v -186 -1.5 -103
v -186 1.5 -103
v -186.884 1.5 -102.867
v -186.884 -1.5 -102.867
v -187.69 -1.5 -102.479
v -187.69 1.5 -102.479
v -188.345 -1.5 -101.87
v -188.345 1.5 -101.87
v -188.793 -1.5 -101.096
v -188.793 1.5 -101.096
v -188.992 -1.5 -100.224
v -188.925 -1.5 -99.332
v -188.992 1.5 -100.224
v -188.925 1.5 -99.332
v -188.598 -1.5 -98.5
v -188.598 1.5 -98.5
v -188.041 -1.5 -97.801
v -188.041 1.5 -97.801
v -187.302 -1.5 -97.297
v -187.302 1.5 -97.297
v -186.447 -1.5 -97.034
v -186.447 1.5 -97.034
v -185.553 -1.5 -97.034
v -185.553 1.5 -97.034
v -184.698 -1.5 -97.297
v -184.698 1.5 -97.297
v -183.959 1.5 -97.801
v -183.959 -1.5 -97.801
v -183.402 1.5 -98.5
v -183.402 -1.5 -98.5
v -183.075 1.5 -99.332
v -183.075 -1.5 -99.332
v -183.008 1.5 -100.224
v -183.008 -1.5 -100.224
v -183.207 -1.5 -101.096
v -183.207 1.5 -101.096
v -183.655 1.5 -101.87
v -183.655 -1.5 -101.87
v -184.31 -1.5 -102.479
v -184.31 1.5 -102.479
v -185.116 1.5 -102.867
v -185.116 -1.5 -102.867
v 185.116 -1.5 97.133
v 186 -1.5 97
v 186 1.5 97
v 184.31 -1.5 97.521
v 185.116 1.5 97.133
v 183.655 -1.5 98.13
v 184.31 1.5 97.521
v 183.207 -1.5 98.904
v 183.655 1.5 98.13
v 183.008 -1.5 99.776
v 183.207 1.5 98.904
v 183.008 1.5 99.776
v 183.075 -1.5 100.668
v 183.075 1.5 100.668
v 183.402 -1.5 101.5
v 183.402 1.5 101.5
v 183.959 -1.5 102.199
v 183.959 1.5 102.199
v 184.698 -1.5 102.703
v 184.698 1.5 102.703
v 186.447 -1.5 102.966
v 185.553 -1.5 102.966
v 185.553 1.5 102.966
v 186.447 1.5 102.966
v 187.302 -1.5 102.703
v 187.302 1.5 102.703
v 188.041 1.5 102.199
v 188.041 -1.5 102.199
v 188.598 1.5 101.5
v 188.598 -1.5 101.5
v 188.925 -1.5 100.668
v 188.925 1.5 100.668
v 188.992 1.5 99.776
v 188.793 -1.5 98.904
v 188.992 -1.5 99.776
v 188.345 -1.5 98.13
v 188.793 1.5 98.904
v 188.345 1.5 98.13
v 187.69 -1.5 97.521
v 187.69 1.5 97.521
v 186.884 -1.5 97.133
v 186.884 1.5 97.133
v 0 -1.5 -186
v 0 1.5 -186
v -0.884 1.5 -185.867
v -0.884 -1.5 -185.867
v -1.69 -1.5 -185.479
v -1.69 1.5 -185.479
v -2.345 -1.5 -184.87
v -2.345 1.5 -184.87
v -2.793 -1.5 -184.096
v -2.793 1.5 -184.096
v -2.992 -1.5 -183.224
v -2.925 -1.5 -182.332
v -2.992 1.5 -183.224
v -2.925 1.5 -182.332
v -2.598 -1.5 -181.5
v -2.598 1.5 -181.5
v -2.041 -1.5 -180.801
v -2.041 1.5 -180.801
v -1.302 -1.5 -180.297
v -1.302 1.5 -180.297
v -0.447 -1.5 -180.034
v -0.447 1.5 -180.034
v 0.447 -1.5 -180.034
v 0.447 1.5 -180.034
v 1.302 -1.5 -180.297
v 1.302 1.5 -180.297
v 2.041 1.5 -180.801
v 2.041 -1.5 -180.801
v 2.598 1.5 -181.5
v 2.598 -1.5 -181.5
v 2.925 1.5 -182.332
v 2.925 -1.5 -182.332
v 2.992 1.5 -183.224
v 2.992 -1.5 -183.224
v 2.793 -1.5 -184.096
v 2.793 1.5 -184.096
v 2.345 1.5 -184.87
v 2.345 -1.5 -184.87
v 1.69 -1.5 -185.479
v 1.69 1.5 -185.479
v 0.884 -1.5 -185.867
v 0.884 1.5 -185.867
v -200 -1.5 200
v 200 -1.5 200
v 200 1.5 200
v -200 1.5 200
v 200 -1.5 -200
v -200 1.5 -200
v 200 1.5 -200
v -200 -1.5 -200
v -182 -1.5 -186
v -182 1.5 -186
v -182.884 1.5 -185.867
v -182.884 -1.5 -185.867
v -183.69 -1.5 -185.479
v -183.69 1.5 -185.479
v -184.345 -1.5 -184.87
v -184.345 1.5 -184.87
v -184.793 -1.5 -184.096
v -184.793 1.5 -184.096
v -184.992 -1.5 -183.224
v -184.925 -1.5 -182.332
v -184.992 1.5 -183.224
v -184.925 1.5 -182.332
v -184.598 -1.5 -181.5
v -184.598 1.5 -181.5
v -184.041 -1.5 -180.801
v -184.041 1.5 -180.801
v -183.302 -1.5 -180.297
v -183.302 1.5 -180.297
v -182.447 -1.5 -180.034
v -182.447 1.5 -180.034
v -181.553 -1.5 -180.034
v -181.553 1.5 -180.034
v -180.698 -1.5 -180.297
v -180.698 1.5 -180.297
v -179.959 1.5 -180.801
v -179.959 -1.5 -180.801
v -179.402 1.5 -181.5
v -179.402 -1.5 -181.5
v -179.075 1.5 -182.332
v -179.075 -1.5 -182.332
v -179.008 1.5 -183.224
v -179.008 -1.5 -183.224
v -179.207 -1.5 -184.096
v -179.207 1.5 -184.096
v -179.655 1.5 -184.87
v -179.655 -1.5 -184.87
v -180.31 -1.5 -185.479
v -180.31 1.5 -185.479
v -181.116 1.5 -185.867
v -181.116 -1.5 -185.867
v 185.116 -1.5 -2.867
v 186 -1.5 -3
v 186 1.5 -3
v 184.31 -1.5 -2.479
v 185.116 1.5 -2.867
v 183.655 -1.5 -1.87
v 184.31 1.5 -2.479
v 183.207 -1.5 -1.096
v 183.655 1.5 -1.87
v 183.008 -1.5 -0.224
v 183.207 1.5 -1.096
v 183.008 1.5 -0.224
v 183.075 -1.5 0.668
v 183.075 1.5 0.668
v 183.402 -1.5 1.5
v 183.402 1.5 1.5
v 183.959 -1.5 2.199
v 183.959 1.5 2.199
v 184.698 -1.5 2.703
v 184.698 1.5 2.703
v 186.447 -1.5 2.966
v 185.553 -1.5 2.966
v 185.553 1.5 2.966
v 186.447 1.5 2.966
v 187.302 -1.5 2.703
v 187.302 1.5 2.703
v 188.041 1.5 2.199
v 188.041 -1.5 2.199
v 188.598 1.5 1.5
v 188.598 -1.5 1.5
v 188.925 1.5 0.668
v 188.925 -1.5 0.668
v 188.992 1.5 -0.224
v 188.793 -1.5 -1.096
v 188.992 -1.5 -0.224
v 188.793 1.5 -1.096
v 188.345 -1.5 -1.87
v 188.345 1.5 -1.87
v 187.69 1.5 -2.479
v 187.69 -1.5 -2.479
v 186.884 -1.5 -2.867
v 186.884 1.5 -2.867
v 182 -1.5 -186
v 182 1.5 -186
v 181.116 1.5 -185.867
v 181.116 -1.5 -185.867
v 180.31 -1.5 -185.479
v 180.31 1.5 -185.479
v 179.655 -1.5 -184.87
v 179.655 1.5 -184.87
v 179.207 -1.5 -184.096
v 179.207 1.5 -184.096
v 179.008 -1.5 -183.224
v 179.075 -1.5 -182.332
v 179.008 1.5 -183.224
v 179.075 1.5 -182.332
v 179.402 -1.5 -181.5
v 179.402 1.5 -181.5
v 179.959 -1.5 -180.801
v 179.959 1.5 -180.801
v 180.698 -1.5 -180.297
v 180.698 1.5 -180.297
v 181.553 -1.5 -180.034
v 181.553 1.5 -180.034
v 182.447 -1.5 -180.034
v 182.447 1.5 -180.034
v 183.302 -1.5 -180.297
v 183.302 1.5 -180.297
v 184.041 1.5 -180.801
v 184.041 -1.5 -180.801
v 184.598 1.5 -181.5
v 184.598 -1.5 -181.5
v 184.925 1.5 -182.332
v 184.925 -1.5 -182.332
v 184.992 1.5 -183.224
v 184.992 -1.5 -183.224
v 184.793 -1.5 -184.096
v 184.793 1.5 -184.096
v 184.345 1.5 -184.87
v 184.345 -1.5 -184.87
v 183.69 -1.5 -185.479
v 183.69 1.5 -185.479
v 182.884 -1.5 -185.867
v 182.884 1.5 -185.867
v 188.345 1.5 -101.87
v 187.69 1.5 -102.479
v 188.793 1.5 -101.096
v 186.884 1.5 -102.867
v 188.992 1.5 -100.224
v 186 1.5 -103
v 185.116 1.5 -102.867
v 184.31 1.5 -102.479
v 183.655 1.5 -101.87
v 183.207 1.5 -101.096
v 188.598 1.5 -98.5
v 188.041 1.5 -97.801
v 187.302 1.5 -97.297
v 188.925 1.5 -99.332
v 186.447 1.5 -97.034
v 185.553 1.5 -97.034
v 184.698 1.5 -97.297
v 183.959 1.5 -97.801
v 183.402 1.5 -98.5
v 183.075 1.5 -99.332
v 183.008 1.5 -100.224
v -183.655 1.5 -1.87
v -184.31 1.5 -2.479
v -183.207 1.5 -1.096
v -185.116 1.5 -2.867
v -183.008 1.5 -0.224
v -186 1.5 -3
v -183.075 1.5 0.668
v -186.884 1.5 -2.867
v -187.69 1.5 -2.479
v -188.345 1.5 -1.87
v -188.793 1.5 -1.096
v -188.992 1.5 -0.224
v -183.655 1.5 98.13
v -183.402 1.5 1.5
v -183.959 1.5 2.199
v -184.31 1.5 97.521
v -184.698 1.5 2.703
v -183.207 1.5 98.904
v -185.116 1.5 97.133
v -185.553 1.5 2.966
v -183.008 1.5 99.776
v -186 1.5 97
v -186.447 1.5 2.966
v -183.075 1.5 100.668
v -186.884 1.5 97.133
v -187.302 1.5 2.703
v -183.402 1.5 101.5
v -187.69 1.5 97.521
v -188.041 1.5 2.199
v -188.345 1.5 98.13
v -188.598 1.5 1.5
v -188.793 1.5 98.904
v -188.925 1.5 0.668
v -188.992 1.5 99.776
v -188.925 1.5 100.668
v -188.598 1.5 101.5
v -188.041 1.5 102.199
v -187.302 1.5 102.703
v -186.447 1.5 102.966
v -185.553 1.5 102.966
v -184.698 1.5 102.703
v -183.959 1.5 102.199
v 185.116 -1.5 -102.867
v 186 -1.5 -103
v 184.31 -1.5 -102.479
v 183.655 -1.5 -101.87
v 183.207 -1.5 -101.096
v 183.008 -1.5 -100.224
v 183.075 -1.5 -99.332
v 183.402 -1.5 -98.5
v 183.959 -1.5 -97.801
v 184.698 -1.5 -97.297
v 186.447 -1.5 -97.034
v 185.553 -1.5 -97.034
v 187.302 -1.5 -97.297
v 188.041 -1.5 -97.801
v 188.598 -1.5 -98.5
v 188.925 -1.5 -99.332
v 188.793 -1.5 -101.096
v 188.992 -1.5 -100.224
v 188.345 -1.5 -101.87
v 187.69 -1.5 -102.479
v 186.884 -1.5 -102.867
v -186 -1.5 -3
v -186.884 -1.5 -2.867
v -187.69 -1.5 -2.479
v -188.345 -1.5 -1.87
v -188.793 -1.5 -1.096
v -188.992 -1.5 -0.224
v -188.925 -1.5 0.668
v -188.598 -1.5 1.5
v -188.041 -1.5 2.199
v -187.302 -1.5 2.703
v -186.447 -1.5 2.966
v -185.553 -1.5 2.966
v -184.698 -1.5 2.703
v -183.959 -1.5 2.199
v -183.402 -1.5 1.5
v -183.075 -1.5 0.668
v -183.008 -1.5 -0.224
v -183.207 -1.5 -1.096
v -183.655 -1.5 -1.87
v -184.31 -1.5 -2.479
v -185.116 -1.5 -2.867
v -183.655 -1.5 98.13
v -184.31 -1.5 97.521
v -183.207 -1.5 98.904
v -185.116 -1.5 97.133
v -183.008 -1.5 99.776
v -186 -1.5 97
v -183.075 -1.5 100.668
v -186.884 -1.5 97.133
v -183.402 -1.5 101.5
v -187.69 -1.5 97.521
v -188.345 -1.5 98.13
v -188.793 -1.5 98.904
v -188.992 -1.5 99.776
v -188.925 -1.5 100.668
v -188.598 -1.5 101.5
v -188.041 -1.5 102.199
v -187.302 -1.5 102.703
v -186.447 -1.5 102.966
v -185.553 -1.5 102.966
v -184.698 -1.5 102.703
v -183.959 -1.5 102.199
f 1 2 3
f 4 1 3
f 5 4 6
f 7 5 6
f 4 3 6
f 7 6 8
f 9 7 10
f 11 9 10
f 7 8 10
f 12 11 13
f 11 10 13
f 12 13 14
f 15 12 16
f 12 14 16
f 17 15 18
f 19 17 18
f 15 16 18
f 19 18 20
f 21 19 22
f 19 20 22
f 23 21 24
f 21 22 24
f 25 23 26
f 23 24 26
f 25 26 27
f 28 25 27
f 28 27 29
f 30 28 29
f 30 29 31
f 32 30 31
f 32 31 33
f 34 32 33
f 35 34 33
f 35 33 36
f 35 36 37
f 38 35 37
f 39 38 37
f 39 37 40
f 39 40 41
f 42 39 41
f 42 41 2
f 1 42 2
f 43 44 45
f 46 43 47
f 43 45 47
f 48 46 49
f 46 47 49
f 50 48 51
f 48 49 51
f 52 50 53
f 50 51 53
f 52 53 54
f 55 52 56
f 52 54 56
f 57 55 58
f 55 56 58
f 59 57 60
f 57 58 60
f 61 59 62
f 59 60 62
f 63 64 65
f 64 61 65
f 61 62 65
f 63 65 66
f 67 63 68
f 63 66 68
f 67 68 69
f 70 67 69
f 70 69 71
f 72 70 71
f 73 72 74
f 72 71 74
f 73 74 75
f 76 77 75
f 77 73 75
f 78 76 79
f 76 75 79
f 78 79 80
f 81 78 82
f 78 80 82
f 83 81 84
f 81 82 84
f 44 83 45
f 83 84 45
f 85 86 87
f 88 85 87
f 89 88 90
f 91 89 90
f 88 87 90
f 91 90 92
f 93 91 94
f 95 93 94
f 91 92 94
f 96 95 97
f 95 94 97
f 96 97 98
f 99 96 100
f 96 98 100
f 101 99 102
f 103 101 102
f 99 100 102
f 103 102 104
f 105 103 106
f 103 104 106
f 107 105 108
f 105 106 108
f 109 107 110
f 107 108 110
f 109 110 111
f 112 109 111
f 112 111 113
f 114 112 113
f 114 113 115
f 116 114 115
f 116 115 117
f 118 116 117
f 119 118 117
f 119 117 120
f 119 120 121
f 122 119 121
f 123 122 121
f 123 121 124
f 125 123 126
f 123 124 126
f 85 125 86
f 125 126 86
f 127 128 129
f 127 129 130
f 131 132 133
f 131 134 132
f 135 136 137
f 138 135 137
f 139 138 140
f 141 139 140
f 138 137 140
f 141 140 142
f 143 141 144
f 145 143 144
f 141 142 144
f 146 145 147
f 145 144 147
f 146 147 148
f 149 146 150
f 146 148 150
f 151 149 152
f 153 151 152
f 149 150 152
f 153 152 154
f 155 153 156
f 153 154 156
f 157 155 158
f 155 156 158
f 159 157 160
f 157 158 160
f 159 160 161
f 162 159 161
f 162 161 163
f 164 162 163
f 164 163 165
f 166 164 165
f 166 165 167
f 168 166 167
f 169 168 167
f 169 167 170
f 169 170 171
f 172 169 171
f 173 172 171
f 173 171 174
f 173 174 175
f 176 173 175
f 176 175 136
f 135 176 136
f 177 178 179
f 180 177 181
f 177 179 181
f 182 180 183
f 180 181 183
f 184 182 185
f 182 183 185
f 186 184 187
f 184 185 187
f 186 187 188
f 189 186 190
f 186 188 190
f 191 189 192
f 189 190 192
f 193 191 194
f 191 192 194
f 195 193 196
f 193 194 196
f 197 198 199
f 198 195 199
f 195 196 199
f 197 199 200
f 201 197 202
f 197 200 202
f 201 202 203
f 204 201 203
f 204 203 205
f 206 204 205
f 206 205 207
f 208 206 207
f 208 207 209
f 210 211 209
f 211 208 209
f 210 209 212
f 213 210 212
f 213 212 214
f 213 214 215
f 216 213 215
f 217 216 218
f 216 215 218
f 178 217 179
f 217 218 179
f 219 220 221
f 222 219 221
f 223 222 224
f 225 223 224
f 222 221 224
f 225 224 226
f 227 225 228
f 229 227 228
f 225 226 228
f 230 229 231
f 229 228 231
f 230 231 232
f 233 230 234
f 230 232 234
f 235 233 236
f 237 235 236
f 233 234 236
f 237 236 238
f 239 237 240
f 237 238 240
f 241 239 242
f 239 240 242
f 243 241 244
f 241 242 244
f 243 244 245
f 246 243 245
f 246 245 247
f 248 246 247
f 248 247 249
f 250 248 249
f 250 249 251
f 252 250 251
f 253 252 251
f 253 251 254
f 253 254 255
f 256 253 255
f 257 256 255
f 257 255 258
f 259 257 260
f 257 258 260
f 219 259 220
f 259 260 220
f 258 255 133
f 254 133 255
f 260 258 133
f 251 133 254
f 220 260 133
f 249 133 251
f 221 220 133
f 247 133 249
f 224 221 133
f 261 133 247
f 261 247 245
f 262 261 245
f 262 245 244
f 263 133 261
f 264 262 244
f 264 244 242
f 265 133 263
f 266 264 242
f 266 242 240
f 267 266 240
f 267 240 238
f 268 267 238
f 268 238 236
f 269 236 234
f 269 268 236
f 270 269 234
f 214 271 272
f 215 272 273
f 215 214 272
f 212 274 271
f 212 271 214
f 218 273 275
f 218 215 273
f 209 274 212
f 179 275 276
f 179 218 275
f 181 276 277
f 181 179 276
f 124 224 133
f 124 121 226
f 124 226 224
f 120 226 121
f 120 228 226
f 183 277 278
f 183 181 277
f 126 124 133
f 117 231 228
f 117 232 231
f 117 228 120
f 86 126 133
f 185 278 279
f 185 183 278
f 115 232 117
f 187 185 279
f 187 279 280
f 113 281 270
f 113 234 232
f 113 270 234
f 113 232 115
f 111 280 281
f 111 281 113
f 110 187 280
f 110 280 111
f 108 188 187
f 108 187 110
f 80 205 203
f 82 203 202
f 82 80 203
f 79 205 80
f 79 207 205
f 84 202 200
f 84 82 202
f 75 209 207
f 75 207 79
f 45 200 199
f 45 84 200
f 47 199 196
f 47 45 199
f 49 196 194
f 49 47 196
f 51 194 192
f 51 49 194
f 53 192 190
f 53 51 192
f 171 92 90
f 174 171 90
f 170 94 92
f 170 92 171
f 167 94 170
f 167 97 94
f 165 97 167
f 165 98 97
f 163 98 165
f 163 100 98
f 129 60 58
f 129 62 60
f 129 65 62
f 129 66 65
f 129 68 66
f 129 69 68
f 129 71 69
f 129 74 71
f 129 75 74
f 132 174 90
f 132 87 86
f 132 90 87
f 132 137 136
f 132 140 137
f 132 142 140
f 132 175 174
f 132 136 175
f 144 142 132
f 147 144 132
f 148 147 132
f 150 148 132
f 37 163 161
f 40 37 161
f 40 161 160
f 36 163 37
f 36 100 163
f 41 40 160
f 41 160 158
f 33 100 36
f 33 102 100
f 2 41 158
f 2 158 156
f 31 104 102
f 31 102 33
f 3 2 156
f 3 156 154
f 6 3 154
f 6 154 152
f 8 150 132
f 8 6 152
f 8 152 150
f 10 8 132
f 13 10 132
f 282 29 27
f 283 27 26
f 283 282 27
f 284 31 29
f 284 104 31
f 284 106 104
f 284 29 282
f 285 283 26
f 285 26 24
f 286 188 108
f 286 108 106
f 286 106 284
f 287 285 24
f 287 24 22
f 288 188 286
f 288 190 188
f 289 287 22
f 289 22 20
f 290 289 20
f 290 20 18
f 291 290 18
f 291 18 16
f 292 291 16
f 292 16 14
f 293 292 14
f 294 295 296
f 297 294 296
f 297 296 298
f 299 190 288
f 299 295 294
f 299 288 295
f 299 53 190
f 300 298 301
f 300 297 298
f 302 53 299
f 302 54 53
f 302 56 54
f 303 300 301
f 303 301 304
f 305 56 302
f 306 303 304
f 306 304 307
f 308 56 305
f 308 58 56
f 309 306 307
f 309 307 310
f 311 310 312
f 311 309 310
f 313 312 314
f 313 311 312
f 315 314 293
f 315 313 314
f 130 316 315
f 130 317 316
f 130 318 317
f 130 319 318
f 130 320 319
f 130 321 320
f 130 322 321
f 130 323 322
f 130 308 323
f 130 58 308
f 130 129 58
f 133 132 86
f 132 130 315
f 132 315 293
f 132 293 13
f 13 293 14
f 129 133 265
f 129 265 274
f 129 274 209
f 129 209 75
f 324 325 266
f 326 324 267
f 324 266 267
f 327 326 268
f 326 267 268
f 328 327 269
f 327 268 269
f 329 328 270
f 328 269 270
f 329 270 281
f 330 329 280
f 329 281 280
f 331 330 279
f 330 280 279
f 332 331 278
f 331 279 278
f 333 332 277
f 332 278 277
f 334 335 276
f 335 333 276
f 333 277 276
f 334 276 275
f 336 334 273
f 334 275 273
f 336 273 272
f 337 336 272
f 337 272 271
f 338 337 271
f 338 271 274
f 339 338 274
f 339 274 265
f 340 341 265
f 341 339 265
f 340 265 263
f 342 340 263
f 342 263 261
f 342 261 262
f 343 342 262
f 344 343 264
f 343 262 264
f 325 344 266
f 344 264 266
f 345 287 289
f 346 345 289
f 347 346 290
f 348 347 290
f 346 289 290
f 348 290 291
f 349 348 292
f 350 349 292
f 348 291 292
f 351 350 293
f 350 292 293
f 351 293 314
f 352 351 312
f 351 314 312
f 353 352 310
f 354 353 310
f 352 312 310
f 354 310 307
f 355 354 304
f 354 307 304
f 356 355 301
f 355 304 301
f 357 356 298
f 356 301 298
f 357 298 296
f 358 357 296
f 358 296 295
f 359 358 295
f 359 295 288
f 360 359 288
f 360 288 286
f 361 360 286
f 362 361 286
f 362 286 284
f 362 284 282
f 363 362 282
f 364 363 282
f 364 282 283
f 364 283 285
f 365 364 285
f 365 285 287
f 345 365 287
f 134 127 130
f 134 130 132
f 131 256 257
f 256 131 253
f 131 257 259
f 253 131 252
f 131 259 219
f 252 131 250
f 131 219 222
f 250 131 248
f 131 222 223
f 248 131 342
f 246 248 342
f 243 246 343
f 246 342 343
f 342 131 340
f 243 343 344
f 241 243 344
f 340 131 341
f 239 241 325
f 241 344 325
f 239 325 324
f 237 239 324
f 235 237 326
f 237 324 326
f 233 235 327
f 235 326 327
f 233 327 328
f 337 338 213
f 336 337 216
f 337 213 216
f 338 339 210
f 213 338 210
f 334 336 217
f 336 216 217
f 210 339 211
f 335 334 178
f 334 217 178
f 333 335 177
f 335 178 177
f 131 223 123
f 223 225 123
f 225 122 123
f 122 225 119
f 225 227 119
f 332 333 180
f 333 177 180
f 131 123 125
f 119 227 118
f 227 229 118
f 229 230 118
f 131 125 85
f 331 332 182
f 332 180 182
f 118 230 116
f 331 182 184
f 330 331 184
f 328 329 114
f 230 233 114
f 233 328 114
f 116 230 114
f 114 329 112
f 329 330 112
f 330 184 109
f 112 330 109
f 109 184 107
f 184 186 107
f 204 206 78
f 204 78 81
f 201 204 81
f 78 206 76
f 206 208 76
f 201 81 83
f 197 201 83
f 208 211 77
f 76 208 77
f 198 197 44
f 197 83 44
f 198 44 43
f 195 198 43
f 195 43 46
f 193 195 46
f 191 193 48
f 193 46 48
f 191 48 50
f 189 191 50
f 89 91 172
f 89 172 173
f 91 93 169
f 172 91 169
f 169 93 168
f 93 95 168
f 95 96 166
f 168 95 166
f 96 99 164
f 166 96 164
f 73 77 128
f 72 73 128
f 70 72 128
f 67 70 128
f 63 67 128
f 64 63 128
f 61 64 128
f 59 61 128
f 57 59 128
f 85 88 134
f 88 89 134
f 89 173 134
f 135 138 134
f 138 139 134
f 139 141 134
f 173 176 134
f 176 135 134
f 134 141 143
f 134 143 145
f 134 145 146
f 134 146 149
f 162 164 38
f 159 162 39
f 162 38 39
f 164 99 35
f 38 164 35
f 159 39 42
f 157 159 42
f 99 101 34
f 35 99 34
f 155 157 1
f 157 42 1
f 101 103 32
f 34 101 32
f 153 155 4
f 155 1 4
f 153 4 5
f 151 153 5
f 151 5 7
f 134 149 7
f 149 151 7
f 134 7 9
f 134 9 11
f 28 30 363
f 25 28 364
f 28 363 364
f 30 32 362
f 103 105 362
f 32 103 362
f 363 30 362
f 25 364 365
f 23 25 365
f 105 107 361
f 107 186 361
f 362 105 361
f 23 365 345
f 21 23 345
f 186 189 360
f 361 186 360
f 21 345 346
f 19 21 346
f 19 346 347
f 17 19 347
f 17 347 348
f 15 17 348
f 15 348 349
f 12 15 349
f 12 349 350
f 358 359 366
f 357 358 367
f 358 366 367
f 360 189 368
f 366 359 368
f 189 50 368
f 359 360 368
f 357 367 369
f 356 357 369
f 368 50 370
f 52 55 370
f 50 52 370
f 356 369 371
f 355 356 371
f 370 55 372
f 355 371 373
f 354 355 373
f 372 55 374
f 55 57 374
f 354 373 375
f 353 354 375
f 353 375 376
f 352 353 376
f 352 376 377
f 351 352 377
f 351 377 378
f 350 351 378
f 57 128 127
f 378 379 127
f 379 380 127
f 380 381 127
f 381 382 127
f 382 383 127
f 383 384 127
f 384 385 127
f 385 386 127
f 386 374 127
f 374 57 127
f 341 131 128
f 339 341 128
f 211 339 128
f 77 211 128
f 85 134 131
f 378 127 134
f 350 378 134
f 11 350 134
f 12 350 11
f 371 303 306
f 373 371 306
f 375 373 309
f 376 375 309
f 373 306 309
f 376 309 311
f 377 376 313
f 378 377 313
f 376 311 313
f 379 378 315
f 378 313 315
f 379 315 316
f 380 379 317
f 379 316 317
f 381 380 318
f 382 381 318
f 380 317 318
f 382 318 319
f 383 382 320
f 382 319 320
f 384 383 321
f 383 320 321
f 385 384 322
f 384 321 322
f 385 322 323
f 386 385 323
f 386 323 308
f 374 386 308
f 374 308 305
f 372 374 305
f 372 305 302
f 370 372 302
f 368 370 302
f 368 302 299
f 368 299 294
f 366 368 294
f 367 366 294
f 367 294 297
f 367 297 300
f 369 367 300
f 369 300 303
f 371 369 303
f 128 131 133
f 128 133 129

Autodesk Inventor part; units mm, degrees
ref_plane "YZ Plane" through (0, 0, 0) normal (1, 0, 0) x (0, 1, 0)
ref_plane "XZ Plane" through (0, 0, 0) normal (0, 1, 0) x (-1, 0, 0)
ref_plane "XY Plane" through (0, 0, 0) normal (0, 0, 1) x (1, 0, 0)
sketch "Sketch1" plane through (0, 0, 0) normal (0, 1, 0) x (-1, 0, 0)
  line L0 (-200, 200) -> (200, 200)
  line L1 (200, 200) -> (200, -200)
  line L2 (200, -200) -> (-200, -200)
  line L3 (-200, -200) -> (-200, 200)
  line L4 (-200, 200) -> (200, -200) construction
  line L5 (200, 200) -> (-200, -200) construction
  point P0 (0, 0)
  dimension "d0" = 400
extrude "Extrusion1" add sketch "Sketch1" along normal mid plane 3
sketch "Sketch2" plane through (0, -1.5, 0) normal (0, -1, 0) x (1, 0, 0)
  line L0 (-200, -200) -> (200, -200) projected
  point P0 (0, 0)
  point P1 (-182, -183)
  point P2 (0, -183)
  point P3 (182, -183)
  dimension "d3" = 182
  dimension "d4" = 182
  dimension "d5" = 17
hole "Hole1" at (-182, -1.5, -183) at (0, -1.5, -183) at (182, -1.5, -183) direction (0, 1, 0) diameter 6 depth 14.2 tip angle 118
sketch "Sketch3" plane through (0, -1.5, 0) normal (0, -1, 0) x (1, 0, 0)
  line L0 (200, 200) -> (-200, 200) projected
  line L1 (-200, 200) -> (-200, -200) projected
  point P0 (0, 0)
  point P1 (-186, 100)
  point P2 (-186, 0)
  point P3 (-186, -100)
  dimension "d13" = 100
  dimension "d14" = 100
  dimension "d15" = 100
  dimension "d16" = 14
hole "Hole2" at (-186, -1.5, 100) at (-186, -1.5, 0) at (-186, -1.5, -100) direction (0, 1, 0) diameter 6 depth 14.2 tip angle 118
mirror "Mirror1" about plane through (0, 0, 0) normal (1, 0, 0) of "Hole2"
equation "\"d4\" = d3"
equation "\"d14\" = d13"
equation "\"d15\" = d14"
properties part number "HCMUTE-CDT23-KXL_A02" material "PMMA Plastic"
